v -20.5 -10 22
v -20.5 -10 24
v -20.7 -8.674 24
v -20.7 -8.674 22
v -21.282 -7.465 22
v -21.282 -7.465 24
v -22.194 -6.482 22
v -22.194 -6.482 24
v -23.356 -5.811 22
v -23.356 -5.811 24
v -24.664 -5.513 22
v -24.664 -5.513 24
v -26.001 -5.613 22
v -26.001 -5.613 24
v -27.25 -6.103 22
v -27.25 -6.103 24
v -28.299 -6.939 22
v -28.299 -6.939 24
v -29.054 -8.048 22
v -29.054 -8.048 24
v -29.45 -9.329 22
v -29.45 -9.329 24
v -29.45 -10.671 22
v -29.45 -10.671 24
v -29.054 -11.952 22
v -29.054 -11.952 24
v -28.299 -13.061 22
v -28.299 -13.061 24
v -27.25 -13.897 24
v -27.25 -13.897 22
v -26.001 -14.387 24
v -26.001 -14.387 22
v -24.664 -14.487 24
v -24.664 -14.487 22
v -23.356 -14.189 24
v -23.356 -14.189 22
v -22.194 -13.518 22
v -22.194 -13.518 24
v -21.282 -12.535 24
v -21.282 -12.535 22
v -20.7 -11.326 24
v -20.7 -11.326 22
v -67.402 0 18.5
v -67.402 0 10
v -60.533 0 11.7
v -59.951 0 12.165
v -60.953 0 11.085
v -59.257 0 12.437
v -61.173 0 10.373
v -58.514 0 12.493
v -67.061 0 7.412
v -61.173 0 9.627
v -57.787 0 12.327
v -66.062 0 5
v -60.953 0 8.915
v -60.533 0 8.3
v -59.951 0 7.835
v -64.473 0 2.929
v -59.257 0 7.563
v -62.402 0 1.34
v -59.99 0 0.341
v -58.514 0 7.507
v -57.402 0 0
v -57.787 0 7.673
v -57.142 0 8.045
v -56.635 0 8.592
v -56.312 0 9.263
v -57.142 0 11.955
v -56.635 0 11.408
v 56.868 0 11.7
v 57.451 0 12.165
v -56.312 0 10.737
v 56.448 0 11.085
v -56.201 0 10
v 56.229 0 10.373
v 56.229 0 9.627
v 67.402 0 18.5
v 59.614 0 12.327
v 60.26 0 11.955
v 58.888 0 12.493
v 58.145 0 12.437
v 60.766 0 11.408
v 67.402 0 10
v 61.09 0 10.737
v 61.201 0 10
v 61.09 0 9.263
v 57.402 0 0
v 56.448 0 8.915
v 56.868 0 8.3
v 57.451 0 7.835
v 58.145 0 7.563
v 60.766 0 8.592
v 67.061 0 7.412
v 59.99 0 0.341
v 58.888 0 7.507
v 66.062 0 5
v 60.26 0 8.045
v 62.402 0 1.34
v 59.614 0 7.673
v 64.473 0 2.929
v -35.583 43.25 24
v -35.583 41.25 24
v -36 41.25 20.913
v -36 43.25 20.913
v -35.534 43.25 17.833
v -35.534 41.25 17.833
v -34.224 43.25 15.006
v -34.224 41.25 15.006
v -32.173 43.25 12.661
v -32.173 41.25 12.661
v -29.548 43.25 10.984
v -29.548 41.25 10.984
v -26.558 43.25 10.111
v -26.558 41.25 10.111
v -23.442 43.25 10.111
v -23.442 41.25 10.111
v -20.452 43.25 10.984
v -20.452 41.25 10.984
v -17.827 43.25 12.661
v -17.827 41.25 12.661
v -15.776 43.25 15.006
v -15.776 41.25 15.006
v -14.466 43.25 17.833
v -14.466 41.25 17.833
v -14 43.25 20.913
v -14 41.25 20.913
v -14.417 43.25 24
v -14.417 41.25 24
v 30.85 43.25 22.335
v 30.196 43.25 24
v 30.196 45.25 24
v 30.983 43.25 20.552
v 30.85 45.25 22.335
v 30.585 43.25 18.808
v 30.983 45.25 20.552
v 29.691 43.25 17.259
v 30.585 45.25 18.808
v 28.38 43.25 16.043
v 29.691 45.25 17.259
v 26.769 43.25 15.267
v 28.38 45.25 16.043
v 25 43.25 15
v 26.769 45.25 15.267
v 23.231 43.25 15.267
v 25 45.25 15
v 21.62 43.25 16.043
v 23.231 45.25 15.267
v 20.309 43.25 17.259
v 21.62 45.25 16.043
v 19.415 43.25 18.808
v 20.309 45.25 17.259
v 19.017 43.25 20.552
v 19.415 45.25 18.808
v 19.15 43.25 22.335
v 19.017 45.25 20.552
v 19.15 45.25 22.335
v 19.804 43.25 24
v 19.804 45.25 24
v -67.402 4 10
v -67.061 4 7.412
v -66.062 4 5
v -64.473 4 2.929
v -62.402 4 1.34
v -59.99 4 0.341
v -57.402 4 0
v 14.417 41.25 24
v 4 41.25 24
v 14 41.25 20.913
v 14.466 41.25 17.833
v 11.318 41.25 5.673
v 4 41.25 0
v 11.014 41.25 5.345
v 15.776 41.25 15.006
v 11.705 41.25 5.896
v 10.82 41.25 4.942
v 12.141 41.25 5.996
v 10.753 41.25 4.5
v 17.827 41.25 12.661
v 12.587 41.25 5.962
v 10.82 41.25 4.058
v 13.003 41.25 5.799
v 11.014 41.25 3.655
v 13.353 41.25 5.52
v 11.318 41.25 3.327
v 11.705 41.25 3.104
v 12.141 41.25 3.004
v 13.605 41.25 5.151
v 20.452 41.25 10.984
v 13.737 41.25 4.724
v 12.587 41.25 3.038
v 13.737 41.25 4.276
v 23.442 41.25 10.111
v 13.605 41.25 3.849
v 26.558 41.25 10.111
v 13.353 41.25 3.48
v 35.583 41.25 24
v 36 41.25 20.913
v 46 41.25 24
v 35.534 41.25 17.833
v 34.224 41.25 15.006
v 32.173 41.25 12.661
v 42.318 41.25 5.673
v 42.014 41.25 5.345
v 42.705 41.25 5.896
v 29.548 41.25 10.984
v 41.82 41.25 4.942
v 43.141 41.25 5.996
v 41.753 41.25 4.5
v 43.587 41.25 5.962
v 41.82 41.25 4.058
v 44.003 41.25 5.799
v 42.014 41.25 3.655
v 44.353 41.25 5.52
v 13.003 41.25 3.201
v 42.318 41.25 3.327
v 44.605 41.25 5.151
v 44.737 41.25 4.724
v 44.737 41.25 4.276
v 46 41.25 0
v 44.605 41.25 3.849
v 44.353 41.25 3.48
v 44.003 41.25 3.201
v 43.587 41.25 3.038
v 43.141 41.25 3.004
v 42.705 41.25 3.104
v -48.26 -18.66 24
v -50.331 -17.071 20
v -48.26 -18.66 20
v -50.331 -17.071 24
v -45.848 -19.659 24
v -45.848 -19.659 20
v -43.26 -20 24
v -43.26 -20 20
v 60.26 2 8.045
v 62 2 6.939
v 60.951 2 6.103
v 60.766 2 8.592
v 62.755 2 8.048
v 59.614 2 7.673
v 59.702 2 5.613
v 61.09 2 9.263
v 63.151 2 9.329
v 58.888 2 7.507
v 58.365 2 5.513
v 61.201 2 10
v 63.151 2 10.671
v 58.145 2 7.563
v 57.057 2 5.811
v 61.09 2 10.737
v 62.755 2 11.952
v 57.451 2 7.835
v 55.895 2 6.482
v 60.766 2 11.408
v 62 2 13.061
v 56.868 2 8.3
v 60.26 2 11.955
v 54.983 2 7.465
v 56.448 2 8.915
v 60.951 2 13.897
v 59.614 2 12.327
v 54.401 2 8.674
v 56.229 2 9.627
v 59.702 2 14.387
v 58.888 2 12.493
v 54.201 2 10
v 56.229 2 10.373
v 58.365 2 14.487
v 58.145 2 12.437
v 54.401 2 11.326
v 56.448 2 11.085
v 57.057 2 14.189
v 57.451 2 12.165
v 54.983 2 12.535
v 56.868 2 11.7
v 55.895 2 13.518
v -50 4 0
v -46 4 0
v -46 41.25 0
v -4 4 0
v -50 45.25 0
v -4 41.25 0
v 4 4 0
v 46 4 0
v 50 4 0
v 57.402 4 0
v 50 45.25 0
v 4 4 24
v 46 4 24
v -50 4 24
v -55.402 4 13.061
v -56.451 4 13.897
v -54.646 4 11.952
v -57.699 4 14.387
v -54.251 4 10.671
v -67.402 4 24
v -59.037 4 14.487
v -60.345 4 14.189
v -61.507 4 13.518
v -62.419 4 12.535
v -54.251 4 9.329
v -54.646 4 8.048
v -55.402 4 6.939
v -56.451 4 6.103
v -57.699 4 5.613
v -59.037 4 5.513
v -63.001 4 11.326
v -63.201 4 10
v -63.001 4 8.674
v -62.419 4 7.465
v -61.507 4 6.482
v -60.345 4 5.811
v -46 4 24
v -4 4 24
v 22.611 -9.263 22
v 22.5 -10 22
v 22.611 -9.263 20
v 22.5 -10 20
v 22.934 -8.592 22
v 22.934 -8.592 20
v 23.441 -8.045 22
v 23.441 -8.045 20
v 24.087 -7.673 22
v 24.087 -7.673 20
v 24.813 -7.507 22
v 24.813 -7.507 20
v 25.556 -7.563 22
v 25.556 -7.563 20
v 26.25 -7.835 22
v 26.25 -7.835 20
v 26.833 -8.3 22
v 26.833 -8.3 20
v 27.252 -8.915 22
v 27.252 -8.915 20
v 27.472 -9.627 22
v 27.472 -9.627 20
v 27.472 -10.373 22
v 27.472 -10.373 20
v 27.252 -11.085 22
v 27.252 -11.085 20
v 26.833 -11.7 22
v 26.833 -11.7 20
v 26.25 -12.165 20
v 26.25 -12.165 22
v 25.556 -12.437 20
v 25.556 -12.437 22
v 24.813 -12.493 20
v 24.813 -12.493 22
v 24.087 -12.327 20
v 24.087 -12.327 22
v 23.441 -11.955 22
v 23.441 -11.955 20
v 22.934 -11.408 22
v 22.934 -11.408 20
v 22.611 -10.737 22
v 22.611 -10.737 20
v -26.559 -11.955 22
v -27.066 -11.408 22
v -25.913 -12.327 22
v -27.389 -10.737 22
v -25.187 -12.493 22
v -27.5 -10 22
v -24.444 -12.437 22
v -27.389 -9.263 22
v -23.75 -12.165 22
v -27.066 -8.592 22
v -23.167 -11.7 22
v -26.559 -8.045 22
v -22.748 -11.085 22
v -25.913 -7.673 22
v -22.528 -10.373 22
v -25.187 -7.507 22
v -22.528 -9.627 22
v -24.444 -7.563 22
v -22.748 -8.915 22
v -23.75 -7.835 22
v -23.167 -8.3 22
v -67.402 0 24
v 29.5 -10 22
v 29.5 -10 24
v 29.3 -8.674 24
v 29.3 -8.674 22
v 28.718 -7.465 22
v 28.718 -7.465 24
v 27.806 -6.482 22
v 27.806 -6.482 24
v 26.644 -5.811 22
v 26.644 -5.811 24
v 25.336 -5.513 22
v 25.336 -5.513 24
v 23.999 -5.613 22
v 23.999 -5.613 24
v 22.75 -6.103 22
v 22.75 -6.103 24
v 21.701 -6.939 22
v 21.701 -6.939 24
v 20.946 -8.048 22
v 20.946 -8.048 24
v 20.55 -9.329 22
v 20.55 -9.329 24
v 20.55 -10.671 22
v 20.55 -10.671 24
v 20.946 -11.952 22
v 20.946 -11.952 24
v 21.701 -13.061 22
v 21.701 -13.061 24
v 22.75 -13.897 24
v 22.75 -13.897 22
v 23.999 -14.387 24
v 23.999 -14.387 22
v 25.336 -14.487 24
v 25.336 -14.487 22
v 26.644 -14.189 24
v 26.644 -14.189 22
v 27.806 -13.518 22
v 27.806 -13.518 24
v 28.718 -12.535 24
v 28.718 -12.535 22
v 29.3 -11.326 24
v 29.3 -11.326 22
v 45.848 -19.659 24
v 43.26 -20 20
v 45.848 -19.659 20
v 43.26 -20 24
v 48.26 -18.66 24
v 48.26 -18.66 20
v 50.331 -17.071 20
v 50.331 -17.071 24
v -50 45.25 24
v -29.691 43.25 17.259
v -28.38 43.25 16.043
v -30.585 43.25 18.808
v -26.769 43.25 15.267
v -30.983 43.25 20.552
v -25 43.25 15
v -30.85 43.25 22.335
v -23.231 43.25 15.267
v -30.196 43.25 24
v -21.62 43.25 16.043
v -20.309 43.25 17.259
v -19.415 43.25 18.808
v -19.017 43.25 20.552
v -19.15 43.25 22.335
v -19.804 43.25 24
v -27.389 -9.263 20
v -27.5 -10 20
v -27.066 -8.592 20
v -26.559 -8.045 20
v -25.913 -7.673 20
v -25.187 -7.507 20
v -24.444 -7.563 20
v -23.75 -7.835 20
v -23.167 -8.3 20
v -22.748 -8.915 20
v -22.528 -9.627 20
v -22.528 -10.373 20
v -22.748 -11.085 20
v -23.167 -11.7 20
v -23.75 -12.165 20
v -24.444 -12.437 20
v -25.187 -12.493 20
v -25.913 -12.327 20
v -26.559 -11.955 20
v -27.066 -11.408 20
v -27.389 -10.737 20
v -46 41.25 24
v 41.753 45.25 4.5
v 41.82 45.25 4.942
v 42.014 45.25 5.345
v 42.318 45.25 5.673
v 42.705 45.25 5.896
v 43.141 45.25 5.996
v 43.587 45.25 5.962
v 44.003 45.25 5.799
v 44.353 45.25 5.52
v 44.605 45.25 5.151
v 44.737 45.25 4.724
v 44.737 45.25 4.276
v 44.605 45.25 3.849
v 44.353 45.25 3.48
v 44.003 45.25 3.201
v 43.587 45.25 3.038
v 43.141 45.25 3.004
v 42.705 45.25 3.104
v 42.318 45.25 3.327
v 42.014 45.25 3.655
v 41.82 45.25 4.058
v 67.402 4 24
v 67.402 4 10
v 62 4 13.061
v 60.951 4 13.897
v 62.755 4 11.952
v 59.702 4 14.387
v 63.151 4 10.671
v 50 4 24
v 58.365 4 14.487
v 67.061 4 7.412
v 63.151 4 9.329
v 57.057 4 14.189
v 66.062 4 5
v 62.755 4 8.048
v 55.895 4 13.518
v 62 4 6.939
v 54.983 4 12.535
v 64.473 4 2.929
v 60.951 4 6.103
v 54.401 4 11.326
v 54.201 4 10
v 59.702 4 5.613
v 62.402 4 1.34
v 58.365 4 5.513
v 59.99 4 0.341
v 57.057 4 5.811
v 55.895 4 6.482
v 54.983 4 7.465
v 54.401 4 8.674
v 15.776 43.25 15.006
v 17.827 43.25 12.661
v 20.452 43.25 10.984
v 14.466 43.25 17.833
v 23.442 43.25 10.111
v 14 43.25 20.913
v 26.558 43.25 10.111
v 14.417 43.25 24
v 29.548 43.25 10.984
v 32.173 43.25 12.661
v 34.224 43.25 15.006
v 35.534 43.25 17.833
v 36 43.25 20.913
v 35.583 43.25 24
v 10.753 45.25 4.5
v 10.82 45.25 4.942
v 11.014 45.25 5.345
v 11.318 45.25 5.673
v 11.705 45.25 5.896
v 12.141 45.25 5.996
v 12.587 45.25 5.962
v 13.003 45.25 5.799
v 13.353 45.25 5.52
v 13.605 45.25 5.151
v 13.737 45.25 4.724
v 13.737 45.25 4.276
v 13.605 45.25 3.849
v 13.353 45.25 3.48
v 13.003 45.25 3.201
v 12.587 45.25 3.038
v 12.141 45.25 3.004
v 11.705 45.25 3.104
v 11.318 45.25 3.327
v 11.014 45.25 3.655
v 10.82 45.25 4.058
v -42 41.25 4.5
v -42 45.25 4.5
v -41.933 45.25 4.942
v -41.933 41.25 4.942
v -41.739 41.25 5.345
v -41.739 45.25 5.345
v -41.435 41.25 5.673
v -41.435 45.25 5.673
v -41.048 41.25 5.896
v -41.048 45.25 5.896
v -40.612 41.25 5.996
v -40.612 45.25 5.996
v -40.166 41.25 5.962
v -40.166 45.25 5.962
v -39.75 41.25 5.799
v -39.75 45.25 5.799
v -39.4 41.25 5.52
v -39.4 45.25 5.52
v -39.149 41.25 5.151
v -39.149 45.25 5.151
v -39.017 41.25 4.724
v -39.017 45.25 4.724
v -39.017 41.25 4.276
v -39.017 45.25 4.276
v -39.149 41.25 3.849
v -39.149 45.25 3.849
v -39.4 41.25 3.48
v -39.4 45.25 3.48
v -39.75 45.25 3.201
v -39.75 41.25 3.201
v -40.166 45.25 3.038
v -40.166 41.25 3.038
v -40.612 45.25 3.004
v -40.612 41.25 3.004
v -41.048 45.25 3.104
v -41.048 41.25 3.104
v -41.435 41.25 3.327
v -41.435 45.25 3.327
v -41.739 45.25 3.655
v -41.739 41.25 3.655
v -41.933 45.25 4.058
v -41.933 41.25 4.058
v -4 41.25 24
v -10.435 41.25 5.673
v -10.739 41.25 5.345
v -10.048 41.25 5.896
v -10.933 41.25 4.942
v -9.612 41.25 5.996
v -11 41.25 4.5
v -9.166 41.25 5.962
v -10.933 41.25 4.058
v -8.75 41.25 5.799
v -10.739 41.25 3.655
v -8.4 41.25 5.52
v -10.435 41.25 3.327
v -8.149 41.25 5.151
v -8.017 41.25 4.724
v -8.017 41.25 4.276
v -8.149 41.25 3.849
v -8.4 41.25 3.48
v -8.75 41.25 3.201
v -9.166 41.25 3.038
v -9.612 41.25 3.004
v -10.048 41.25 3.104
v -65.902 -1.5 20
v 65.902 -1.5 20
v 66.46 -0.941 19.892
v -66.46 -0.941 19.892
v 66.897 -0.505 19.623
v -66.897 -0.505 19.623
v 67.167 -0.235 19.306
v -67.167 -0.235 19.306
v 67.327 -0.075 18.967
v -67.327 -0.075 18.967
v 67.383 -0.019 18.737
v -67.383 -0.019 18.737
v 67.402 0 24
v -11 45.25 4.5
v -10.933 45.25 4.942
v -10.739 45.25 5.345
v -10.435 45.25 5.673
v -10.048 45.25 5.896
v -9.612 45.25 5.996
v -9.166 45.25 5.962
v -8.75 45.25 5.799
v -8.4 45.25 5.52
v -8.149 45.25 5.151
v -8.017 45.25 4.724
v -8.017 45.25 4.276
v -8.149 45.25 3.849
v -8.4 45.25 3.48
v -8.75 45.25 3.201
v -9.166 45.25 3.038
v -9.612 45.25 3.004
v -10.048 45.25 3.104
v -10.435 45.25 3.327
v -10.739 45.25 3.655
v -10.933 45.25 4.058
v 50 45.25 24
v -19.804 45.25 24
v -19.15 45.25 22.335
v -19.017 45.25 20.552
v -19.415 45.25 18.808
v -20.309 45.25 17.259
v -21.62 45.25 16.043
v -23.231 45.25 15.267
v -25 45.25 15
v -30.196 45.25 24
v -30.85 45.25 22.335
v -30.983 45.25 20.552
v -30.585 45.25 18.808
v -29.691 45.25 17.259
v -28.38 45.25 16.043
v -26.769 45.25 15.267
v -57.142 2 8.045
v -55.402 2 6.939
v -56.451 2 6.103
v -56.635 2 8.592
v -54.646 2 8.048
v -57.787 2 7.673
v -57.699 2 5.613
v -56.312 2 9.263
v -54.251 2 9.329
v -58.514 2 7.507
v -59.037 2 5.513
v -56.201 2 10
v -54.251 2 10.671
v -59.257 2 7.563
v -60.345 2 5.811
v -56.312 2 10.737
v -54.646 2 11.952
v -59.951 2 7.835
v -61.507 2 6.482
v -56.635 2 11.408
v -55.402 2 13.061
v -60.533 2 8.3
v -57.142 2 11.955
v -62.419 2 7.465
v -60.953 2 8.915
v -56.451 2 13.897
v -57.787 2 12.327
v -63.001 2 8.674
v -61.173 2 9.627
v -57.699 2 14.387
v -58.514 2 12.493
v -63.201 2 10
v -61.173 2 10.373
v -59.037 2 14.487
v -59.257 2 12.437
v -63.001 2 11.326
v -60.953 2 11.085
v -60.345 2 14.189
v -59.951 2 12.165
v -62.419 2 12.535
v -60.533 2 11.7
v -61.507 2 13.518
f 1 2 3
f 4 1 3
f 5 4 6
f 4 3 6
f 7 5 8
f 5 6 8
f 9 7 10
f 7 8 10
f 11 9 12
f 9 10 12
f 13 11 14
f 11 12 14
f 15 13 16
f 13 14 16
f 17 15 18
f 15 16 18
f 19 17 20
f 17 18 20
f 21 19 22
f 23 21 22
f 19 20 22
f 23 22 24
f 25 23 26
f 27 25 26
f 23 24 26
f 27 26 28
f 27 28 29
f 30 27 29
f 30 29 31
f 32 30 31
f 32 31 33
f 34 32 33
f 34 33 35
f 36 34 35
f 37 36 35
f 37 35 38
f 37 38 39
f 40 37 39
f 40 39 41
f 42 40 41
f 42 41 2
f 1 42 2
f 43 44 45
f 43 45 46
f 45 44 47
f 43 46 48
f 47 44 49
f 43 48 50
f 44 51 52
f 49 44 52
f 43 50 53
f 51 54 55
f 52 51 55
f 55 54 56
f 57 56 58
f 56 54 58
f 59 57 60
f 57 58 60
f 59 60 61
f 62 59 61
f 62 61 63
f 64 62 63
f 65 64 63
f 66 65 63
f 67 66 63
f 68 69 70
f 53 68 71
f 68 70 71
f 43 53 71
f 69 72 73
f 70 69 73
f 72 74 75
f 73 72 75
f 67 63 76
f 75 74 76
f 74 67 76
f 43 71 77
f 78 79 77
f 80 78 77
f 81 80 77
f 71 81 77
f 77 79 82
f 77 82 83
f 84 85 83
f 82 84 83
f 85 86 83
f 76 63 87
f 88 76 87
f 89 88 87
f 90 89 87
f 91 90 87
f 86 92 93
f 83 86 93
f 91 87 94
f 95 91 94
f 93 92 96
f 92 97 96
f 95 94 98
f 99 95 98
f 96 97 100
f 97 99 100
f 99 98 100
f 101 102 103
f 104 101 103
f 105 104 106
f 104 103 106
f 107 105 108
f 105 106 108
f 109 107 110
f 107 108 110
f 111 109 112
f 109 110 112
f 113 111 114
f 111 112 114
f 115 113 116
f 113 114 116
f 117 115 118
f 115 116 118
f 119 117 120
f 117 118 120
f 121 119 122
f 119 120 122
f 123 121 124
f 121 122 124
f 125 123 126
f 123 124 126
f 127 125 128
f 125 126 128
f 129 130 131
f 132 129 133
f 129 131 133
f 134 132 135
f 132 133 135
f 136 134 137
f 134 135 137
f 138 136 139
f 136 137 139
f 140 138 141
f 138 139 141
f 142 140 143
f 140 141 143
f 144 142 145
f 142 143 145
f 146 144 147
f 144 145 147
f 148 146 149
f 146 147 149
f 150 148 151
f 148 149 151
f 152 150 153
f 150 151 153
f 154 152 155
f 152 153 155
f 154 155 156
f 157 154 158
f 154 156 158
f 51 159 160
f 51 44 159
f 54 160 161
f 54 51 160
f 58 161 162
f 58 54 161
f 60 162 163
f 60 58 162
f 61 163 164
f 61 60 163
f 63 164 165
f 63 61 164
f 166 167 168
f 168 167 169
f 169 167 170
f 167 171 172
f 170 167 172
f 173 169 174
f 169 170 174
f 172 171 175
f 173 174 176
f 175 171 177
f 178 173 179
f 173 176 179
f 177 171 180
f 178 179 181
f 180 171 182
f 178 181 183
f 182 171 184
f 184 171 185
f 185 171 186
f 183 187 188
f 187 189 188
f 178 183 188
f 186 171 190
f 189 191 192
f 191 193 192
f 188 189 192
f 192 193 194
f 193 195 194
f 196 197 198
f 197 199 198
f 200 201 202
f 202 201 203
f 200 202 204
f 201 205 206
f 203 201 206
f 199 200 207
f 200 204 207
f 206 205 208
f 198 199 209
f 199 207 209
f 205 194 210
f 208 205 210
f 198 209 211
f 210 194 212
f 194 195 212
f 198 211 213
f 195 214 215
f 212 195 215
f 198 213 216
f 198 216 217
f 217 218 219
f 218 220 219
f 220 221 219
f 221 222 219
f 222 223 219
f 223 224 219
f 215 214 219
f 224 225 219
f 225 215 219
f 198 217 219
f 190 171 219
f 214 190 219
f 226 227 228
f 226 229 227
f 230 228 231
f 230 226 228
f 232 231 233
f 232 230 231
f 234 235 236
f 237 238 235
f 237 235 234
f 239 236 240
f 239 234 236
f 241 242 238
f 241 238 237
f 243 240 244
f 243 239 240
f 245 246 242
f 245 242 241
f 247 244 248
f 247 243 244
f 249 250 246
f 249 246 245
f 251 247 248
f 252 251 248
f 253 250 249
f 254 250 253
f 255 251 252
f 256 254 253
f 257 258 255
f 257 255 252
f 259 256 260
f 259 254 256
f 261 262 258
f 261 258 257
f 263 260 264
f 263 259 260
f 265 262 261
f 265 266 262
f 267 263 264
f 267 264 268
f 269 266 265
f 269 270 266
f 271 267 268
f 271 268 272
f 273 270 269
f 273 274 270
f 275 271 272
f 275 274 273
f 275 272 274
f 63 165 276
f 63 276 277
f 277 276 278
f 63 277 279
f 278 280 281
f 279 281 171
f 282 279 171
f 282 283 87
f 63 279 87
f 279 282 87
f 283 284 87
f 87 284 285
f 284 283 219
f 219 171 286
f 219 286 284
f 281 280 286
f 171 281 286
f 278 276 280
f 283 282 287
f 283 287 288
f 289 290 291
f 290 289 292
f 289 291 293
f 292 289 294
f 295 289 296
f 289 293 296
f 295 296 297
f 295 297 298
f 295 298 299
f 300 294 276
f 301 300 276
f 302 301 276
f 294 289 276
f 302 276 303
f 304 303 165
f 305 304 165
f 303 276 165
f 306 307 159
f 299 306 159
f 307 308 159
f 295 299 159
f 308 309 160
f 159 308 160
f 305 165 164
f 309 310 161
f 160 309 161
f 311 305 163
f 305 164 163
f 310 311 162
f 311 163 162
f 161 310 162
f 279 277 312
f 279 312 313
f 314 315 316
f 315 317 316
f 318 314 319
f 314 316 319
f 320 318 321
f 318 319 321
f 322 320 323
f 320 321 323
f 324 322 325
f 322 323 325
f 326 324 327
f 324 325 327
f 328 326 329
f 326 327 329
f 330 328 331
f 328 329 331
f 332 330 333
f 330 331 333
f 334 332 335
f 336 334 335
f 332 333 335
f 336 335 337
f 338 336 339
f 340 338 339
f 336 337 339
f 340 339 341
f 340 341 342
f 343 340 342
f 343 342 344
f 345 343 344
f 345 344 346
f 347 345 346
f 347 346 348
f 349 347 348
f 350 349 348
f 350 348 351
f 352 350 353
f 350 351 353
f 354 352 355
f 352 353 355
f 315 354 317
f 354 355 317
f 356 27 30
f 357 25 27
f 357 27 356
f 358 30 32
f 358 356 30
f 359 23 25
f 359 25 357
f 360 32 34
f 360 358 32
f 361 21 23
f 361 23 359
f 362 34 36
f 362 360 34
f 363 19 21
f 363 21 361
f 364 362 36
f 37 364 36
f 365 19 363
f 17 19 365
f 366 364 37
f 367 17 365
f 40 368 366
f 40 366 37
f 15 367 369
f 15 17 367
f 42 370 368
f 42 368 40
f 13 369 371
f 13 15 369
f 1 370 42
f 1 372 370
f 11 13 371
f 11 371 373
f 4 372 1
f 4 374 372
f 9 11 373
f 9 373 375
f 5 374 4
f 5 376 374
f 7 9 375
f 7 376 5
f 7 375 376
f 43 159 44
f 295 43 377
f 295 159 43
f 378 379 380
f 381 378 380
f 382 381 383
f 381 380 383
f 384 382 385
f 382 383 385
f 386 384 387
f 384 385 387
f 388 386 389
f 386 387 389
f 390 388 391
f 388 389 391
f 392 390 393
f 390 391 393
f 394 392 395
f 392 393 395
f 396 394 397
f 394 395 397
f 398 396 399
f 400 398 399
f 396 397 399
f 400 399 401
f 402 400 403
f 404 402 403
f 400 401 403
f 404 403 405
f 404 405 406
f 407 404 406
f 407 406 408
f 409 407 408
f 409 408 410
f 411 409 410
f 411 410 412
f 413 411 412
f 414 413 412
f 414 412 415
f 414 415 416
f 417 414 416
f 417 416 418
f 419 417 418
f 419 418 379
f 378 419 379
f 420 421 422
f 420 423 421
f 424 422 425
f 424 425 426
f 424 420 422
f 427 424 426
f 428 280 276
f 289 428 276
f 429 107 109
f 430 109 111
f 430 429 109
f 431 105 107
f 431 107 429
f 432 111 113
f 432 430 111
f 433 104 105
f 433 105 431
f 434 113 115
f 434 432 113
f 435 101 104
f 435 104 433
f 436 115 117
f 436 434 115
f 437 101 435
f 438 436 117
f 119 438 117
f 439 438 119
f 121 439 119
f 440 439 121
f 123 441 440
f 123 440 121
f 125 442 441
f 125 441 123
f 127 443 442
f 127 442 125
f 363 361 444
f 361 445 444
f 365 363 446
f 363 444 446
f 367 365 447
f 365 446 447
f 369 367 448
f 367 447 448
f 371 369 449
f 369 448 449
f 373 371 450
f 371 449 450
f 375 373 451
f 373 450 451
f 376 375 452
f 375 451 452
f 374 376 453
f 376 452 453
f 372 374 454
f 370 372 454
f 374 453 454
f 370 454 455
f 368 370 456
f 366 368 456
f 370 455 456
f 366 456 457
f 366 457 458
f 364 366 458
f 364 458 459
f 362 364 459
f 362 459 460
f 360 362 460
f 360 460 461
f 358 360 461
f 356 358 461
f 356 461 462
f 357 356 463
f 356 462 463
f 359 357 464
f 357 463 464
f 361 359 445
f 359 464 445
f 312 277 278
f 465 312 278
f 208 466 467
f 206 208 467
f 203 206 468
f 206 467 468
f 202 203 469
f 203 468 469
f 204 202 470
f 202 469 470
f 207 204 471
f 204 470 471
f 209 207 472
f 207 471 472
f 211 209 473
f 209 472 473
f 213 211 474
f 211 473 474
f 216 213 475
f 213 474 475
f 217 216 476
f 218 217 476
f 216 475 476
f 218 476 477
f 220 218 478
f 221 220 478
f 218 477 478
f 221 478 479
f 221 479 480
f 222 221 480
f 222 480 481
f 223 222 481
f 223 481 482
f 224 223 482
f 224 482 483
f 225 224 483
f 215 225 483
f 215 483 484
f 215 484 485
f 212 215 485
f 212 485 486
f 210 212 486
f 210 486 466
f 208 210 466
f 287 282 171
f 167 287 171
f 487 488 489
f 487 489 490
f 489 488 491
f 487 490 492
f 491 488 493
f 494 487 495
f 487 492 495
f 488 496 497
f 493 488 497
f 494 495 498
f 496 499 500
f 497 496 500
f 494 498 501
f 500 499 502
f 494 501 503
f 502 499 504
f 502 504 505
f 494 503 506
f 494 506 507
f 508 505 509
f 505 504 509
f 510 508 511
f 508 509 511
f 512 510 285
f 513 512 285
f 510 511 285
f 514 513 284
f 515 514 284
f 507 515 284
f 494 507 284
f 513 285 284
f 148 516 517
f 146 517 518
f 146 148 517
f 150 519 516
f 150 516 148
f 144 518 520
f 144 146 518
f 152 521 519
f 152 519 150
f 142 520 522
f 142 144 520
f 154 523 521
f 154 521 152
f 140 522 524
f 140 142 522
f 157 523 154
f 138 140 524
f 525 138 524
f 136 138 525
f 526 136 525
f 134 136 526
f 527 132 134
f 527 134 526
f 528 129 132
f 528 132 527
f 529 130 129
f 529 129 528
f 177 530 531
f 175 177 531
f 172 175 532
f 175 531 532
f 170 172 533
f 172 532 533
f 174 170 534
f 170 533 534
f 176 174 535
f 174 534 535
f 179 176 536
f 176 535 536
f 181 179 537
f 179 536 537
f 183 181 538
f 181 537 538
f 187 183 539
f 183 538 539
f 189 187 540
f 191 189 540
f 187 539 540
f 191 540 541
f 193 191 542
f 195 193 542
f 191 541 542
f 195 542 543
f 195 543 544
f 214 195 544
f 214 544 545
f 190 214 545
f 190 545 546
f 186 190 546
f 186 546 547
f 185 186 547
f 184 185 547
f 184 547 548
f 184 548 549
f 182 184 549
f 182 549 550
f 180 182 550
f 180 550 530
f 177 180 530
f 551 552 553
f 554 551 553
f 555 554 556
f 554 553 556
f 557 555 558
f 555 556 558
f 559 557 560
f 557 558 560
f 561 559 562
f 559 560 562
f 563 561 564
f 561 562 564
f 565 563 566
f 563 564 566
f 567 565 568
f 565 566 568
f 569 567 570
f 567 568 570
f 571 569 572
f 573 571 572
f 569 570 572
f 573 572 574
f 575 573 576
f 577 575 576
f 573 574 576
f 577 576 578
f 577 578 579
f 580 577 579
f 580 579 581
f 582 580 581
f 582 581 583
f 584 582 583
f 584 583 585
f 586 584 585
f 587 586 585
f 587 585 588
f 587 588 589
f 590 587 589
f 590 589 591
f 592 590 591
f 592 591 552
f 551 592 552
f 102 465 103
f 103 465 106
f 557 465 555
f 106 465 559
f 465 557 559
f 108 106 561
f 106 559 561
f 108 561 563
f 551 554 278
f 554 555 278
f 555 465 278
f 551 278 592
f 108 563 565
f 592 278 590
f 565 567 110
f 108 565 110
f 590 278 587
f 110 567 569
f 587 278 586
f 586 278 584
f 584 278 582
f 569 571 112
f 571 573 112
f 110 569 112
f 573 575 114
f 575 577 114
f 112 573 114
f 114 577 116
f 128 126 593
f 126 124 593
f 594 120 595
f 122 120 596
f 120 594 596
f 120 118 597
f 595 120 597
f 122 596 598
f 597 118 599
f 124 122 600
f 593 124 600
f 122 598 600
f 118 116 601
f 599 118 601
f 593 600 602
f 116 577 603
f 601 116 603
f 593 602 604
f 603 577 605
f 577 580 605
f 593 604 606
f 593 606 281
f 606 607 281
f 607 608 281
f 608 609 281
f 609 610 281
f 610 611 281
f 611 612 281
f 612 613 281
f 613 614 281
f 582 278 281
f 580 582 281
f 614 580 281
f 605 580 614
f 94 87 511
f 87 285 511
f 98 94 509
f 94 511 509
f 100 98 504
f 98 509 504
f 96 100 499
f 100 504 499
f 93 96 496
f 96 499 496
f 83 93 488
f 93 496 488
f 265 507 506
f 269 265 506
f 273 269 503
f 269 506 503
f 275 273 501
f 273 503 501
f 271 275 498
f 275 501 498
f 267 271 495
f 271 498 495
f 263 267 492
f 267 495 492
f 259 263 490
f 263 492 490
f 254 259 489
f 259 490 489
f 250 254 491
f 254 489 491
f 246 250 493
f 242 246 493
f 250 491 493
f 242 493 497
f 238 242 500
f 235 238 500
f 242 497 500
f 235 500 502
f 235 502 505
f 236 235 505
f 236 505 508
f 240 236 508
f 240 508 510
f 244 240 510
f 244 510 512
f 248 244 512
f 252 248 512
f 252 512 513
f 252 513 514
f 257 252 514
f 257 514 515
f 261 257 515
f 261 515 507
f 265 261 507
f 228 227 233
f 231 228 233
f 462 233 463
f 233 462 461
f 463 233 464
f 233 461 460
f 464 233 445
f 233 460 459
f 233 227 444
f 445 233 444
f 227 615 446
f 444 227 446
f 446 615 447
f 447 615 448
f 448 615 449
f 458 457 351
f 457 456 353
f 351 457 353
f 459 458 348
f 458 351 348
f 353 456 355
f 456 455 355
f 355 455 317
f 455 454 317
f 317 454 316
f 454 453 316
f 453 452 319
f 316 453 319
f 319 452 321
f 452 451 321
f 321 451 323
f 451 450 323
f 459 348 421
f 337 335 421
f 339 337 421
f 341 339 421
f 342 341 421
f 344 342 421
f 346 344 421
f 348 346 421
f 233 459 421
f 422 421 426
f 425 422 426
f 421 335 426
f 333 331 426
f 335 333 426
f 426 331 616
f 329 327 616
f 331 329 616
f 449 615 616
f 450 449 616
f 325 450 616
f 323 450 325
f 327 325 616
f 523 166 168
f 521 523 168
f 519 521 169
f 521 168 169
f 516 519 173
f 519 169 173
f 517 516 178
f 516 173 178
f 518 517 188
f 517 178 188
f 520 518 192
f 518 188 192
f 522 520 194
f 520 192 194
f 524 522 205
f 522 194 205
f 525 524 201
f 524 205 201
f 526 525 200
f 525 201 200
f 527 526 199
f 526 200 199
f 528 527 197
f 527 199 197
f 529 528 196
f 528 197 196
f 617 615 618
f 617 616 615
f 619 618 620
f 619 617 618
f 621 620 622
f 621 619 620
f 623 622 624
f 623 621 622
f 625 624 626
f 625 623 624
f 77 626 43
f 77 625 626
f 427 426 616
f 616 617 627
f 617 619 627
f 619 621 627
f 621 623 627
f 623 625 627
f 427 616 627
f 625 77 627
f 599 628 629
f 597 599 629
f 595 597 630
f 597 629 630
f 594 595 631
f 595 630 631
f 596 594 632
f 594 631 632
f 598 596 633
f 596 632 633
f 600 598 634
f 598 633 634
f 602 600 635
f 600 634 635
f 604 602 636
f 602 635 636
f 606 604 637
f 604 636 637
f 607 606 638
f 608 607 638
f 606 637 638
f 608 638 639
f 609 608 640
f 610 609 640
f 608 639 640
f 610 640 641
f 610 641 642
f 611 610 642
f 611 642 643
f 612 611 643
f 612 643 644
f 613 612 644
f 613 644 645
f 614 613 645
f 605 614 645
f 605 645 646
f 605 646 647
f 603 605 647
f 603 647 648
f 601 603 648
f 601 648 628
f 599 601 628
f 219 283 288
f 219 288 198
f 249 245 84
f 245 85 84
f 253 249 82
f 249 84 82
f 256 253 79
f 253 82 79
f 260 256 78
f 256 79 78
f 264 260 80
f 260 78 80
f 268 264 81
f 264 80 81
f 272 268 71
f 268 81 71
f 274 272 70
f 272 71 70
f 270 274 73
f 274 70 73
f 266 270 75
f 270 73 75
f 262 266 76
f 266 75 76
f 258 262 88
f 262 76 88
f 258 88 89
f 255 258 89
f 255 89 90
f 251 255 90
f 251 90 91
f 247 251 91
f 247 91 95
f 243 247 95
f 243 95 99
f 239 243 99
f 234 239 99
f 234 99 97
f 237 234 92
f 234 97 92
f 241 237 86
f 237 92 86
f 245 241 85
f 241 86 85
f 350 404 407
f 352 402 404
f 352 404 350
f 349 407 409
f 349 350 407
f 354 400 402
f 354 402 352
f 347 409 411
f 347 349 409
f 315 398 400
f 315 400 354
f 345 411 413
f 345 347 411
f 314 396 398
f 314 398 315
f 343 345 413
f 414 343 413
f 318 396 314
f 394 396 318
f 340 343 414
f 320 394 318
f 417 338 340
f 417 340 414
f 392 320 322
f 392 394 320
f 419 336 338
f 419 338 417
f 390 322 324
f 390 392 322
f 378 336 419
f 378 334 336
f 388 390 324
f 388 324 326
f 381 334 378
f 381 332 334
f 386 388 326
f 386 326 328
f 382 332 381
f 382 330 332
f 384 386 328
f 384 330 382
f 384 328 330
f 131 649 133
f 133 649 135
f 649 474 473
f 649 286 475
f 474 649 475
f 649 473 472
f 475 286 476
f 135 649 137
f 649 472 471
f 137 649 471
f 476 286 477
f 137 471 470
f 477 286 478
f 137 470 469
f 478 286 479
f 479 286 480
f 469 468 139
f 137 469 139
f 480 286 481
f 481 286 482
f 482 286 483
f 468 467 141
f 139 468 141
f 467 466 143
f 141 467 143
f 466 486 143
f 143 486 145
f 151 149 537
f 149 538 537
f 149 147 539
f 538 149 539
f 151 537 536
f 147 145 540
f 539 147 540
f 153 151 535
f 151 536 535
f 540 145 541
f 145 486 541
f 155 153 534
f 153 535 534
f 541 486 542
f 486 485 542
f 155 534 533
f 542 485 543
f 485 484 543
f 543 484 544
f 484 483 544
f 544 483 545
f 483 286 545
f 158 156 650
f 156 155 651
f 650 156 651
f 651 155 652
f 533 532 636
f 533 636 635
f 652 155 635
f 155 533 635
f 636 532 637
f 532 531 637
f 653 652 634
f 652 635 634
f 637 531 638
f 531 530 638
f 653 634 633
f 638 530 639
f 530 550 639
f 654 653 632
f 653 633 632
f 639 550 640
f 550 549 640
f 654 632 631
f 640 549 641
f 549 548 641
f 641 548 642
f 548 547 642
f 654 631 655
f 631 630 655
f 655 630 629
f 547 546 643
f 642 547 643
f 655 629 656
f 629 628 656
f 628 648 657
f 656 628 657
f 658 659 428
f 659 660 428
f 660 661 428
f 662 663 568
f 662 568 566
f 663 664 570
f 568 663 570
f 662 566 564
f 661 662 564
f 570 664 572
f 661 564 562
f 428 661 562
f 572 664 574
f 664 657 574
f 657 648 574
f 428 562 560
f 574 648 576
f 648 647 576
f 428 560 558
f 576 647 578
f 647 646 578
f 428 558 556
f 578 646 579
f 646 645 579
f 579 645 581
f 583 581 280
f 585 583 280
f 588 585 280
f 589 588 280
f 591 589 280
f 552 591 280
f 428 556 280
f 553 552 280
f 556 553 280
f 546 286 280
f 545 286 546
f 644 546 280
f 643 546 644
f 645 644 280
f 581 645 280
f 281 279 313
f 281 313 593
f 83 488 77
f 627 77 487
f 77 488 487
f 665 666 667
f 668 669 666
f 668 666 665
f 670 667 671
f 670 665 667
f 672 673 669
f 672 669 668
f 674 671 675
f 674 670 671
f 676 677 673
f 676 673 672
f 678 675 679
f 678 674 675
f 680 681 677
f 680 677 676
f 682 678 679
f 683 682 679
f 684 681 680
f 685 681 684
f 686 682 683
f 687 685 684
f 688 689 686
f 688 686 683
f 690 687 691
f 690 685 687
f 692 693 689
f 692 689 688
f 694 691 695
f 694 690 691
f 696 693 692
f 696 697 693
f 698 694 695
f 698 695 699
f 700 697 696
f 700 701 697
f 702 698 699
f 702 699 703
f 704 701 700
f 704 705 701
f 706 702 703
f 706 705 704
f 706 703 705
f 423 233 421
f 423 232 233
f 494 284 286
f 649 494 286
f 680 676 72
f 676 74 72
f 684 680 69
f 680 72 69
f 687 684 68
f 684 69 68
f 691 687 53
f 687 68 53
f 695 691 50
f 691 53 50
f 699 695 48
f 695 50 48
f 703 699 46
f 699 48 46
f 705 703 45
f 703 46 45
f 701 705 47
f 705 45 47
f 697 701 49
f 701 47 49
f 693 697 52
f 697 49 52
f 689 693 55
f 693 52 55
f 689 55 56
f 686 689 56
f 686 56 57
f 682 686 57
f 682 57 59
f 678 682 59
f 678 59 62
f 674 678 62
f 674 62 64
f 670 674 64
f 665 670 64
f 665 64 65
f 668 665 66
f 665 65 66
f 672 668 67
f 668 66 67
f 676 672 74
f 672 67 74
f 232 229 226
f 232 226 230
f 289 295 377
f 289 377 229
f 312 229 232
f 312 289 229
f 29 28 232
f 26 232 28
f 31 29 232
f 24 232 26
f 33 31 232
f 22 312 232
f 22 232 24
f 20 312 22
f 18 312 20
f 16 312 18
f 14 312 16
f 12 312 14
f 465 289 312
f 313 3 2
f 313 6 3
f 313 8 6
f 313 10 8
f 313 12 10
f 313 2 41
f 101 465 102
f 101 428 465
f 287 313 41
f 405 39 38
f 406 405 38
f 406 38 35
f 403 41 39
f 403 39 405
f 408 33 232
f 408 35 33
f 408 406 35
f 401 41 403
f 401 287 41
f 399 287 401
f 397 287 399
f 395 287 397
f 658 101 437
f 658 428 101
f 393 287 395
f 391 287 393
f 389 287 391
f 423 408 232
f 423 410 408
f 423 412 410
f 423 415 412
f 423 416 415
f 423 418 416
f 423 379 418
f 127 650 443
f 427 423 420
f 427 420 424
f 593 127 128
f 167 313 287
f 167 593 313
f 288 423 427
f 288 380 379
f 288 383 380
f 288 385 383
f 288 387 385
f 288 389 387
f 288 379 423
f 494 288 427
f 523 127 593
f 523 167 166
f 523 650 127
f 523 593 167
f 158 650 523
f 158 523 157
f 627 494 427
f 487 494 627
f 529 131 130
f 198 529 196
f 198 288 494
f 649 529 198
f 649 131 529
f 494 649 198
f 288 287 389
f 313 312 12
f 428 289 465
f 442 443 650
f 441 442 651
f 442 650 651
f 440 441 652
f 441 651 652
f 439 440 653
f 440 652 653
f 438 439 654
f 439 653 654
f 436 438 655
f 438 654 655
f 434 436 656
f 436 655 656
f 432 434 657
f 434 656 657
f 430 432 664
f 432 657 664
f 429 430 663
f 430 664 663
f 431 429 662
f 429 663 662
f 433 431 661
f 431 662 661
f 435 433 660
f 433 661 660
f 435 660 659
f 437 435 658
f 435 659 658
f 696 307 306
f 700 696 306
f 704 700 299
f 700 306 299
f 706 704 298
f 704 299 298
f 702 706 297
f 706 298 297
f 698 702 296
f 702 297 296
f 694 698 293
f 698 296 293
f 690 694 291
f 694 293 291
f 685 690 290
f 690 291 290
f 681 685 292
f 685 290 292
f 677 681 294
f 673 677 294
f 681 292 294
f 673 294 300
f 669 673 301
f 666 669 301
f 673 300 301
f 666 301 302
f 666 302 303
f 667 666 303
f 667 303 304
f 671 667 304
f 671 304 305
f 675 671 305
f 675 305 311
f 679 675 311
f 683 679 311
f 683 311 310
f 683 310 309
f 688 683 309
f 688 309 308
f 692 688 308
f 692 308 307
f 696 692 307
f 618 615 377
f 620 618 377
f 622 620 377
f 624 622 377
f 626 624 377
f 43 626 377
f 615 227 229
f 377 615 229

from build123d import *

# Parameters (mm, degrees)
SKETCH077_W         = 42
SKETCH077_H         = 37.25
PAD024_DEPTH        = 24
SKETCH078_R         = 11
POCKET026_DEPTH     = 2
SKETCH079_W         = 134.803292
SKETCH079_H         = 4
PAD025_DEPTH        = 20
HOLE026_D           = 5
HOLE026_DEPTH       = 23.497848
HOLE026_CBORE_D     = 9
HOLE026_CBORE_DEPTH = 2
HOLE026_TIPS_R      = 2.5
HOLE027_D           = 5
HOLE027_DEPTH       = 23.497848
HOLE027_CBORE_D     = 9
HOLE027_CBORE_DEPTH = 2
HOLE027_TIPS_R      = 2.5
CHAMFER001_SIZE     = 20
SKETCH083_R         = 1.5
SKETCH083_R_2       = 6
POCKET027_DEPTH     = 5
FILLET003_R         = 1.5
FILLET004_R         = 10
FILLET005_R         = 10


with BuildPart() as part:
    # Sketch077 → Pad024 (new body)
    with BuildSketch(Plane.XY):
        Polygon((-67.401646, 0), (67.401646, 0), (67.401646, 4), (50, 4), (50, 45.25), (-50, 45.25), (-50, 4), (-67.401646, 4), align=None)
        with Locations((25, 22.625)):
            Rectangle(SKETCH077_W, SKETCH077_H, mode=Mode.SUBTRACT)
        with Locations((-25, 22.625)):
            Rectangle(SKETCH077_W, SKETCH077_H, mode=Mode.SUBTRACT)
    extrude(amount=PAD024_DEPTH)

    # Sketch078 (on Face13 of Pad024) → Pocket026 (cut)
    with BuildSketch(Plane.XZ.offset(-41.25)):
        with Locations((-25, 21)):
            Circle(SKETCH078_R)
        with Locations((25, 21)):
            Circle(SKETCH078_R)
    extrude(amount=-POCKET026_DEPTH, mode=Mode.SUBTRACT)

    # Sketch079 → Pad025 (join)
    with BuildSketch(Plane.XZ):
        with Locations((0, 22)):
            Rectangle(SKETCH079_W, SKETCH079_H)
    extrude(amount=PAD025_DEPTH)

    # Hole026
    with Locations(Plane(origin=(0, 4, 0), x_dir=(-1, 0, 0), z_dir=(0, 1, 0))):
        with Locations((58.700823, 10), (-58.700823, 10)):
            CounterBoreHole(HOLE026_D / 2, HOLE026_CBORE_D / 2, HOLE026_CBORE_DEPTH, depth=HOLE026_DEPTH)

    # Hole026 tips → Hole026 tip 1 section 0
    with BuildSketch(Plane(origin=(0, -19.497848, 0), x_dir=(-1, 0, 0), z_dir=(0, 1, 0)), mode=Mode.PRIVATE) as hole026_tip_1_s0:
        with Locations((58.700823, 10)):
            Circle(HOLE026_TIPS_R)
    loft([hole026_tip_1_s0.sketch, Vertex(-58.700823, -21, 10)], mode=Mode.SUBTRACT)

    # Hole026 tips → Hole026 tip 2 section 0
    with BuildSketch(Plane(origin=(0, -19.497848, 0), x_dir=(-1, 0, 0), z_dir=(0, 1, 0)), mode=Mode.PRIVATE) as hole026_tip_2_s0:
        with Locations((-58.700823, 10)):
            Circle(HOLE026_TIPS_R)
    loft([hole026_tip_2_s0.sketch, Vertex(58.700823, -21, 10)], mode=Mode.SUBTRACT)

    # Hole027
    with Locations(Plane.XY.offset(24)):
        with Locations((-25, -10), (25, -10)):
            CounterBoreHole(HOLE027_D / 2, HOLE027_CBORE_D / 2, HOLE027_CBORE_DEPTH, depth=HOLE027_DEPTH)

    # Hole027 tips → Hole027 tip 1 section 0
    with BuildSketch(Plane.XY.offset(0.502152), mode=Mode.PRIVATE) as hole027_tip_1_s0:
        with Locations((-25, -10)):
            Circle(HOLE027_TIPS_R)
    loft([hole027_tip_1_s0.sketch, Vertex(-25, -10, -1)], mode=Mode.SUBTRACT)

    # Hole027 tips → Hole027 tip 2 section 0
    with BuildSketch(Plane.XY.offset(0.502152), mode=Mode.PRIVATE) as hole027_tip_2_s0:
        with Locations((25, -10)):
            Circle(HOLE027_TIPS_R)
    loft([hole027_tip_2_s0.sketch, Vertex(25, -10, -1)], mode=Mode.SUBTRACT)

    # Chamfer001
    chamfer001_edges = [part.edges().sort_by_distance(p)[0] for p in [
        (-67.401646, -20, 22),
        (67.401646, -20, 22),
    ]]
    chamfer(chamfer001_edges, length=CHAMFER001_SIZE)

    # Sketch083 (on Face12 of Chamfer001) → Pocket027 (cut)
    with BuildSketch(Plane(origin=(0, 45.25, 0), x_dir=(-1, 0, 0), z_dir=(0, 1, 0))):
        with Locations((-43.253433, 4.5)):
            Circle(SKETCH083_R)
        with Locations((-12.253433, 4.5)):
            Circle(SKETCH083_R)
        with Locations((9.5, 4.5)):
            Circle(SKETCH083_R)
        with Locations((40.5, 4.5)):
            Circle(SKETCH083_R)
        with Locations((-25, 21)):
            Circle(SKETCH083_R_2)
        with Locations((25, 21)):
            Circle(SKETCH083_R_2)
    extrude(amount=-POCKET027_DEPTH, mode=Mode.SUBTRACT)

    # Fillet003
    fillet003_edges = [part.edges().sort_by_distance(p)[0] for p in [
        (0, 0, 20),
    ]]
    fillet(fillet003_edges, radius=FILLET003_R)

    # Fillet004
    fillet004_edges = [part.edges().sort_by_distance(p)[0] for p in [
        (-67.401646, 2, 0),
        (67.401646, 2, 0),
    ]]
    fillet(fillet004_edges, radius=FILLET004_R)

    # Fillet005
    fillet005_edges = [part.edges().sort_by_distance(p)[0] for p in [
        (-47.401646, -20, 22),
        (47.401646, -20, 22),
    ]]
    fillet(fillet005_edges, radius=FILLET005_R)


solid = part.part
